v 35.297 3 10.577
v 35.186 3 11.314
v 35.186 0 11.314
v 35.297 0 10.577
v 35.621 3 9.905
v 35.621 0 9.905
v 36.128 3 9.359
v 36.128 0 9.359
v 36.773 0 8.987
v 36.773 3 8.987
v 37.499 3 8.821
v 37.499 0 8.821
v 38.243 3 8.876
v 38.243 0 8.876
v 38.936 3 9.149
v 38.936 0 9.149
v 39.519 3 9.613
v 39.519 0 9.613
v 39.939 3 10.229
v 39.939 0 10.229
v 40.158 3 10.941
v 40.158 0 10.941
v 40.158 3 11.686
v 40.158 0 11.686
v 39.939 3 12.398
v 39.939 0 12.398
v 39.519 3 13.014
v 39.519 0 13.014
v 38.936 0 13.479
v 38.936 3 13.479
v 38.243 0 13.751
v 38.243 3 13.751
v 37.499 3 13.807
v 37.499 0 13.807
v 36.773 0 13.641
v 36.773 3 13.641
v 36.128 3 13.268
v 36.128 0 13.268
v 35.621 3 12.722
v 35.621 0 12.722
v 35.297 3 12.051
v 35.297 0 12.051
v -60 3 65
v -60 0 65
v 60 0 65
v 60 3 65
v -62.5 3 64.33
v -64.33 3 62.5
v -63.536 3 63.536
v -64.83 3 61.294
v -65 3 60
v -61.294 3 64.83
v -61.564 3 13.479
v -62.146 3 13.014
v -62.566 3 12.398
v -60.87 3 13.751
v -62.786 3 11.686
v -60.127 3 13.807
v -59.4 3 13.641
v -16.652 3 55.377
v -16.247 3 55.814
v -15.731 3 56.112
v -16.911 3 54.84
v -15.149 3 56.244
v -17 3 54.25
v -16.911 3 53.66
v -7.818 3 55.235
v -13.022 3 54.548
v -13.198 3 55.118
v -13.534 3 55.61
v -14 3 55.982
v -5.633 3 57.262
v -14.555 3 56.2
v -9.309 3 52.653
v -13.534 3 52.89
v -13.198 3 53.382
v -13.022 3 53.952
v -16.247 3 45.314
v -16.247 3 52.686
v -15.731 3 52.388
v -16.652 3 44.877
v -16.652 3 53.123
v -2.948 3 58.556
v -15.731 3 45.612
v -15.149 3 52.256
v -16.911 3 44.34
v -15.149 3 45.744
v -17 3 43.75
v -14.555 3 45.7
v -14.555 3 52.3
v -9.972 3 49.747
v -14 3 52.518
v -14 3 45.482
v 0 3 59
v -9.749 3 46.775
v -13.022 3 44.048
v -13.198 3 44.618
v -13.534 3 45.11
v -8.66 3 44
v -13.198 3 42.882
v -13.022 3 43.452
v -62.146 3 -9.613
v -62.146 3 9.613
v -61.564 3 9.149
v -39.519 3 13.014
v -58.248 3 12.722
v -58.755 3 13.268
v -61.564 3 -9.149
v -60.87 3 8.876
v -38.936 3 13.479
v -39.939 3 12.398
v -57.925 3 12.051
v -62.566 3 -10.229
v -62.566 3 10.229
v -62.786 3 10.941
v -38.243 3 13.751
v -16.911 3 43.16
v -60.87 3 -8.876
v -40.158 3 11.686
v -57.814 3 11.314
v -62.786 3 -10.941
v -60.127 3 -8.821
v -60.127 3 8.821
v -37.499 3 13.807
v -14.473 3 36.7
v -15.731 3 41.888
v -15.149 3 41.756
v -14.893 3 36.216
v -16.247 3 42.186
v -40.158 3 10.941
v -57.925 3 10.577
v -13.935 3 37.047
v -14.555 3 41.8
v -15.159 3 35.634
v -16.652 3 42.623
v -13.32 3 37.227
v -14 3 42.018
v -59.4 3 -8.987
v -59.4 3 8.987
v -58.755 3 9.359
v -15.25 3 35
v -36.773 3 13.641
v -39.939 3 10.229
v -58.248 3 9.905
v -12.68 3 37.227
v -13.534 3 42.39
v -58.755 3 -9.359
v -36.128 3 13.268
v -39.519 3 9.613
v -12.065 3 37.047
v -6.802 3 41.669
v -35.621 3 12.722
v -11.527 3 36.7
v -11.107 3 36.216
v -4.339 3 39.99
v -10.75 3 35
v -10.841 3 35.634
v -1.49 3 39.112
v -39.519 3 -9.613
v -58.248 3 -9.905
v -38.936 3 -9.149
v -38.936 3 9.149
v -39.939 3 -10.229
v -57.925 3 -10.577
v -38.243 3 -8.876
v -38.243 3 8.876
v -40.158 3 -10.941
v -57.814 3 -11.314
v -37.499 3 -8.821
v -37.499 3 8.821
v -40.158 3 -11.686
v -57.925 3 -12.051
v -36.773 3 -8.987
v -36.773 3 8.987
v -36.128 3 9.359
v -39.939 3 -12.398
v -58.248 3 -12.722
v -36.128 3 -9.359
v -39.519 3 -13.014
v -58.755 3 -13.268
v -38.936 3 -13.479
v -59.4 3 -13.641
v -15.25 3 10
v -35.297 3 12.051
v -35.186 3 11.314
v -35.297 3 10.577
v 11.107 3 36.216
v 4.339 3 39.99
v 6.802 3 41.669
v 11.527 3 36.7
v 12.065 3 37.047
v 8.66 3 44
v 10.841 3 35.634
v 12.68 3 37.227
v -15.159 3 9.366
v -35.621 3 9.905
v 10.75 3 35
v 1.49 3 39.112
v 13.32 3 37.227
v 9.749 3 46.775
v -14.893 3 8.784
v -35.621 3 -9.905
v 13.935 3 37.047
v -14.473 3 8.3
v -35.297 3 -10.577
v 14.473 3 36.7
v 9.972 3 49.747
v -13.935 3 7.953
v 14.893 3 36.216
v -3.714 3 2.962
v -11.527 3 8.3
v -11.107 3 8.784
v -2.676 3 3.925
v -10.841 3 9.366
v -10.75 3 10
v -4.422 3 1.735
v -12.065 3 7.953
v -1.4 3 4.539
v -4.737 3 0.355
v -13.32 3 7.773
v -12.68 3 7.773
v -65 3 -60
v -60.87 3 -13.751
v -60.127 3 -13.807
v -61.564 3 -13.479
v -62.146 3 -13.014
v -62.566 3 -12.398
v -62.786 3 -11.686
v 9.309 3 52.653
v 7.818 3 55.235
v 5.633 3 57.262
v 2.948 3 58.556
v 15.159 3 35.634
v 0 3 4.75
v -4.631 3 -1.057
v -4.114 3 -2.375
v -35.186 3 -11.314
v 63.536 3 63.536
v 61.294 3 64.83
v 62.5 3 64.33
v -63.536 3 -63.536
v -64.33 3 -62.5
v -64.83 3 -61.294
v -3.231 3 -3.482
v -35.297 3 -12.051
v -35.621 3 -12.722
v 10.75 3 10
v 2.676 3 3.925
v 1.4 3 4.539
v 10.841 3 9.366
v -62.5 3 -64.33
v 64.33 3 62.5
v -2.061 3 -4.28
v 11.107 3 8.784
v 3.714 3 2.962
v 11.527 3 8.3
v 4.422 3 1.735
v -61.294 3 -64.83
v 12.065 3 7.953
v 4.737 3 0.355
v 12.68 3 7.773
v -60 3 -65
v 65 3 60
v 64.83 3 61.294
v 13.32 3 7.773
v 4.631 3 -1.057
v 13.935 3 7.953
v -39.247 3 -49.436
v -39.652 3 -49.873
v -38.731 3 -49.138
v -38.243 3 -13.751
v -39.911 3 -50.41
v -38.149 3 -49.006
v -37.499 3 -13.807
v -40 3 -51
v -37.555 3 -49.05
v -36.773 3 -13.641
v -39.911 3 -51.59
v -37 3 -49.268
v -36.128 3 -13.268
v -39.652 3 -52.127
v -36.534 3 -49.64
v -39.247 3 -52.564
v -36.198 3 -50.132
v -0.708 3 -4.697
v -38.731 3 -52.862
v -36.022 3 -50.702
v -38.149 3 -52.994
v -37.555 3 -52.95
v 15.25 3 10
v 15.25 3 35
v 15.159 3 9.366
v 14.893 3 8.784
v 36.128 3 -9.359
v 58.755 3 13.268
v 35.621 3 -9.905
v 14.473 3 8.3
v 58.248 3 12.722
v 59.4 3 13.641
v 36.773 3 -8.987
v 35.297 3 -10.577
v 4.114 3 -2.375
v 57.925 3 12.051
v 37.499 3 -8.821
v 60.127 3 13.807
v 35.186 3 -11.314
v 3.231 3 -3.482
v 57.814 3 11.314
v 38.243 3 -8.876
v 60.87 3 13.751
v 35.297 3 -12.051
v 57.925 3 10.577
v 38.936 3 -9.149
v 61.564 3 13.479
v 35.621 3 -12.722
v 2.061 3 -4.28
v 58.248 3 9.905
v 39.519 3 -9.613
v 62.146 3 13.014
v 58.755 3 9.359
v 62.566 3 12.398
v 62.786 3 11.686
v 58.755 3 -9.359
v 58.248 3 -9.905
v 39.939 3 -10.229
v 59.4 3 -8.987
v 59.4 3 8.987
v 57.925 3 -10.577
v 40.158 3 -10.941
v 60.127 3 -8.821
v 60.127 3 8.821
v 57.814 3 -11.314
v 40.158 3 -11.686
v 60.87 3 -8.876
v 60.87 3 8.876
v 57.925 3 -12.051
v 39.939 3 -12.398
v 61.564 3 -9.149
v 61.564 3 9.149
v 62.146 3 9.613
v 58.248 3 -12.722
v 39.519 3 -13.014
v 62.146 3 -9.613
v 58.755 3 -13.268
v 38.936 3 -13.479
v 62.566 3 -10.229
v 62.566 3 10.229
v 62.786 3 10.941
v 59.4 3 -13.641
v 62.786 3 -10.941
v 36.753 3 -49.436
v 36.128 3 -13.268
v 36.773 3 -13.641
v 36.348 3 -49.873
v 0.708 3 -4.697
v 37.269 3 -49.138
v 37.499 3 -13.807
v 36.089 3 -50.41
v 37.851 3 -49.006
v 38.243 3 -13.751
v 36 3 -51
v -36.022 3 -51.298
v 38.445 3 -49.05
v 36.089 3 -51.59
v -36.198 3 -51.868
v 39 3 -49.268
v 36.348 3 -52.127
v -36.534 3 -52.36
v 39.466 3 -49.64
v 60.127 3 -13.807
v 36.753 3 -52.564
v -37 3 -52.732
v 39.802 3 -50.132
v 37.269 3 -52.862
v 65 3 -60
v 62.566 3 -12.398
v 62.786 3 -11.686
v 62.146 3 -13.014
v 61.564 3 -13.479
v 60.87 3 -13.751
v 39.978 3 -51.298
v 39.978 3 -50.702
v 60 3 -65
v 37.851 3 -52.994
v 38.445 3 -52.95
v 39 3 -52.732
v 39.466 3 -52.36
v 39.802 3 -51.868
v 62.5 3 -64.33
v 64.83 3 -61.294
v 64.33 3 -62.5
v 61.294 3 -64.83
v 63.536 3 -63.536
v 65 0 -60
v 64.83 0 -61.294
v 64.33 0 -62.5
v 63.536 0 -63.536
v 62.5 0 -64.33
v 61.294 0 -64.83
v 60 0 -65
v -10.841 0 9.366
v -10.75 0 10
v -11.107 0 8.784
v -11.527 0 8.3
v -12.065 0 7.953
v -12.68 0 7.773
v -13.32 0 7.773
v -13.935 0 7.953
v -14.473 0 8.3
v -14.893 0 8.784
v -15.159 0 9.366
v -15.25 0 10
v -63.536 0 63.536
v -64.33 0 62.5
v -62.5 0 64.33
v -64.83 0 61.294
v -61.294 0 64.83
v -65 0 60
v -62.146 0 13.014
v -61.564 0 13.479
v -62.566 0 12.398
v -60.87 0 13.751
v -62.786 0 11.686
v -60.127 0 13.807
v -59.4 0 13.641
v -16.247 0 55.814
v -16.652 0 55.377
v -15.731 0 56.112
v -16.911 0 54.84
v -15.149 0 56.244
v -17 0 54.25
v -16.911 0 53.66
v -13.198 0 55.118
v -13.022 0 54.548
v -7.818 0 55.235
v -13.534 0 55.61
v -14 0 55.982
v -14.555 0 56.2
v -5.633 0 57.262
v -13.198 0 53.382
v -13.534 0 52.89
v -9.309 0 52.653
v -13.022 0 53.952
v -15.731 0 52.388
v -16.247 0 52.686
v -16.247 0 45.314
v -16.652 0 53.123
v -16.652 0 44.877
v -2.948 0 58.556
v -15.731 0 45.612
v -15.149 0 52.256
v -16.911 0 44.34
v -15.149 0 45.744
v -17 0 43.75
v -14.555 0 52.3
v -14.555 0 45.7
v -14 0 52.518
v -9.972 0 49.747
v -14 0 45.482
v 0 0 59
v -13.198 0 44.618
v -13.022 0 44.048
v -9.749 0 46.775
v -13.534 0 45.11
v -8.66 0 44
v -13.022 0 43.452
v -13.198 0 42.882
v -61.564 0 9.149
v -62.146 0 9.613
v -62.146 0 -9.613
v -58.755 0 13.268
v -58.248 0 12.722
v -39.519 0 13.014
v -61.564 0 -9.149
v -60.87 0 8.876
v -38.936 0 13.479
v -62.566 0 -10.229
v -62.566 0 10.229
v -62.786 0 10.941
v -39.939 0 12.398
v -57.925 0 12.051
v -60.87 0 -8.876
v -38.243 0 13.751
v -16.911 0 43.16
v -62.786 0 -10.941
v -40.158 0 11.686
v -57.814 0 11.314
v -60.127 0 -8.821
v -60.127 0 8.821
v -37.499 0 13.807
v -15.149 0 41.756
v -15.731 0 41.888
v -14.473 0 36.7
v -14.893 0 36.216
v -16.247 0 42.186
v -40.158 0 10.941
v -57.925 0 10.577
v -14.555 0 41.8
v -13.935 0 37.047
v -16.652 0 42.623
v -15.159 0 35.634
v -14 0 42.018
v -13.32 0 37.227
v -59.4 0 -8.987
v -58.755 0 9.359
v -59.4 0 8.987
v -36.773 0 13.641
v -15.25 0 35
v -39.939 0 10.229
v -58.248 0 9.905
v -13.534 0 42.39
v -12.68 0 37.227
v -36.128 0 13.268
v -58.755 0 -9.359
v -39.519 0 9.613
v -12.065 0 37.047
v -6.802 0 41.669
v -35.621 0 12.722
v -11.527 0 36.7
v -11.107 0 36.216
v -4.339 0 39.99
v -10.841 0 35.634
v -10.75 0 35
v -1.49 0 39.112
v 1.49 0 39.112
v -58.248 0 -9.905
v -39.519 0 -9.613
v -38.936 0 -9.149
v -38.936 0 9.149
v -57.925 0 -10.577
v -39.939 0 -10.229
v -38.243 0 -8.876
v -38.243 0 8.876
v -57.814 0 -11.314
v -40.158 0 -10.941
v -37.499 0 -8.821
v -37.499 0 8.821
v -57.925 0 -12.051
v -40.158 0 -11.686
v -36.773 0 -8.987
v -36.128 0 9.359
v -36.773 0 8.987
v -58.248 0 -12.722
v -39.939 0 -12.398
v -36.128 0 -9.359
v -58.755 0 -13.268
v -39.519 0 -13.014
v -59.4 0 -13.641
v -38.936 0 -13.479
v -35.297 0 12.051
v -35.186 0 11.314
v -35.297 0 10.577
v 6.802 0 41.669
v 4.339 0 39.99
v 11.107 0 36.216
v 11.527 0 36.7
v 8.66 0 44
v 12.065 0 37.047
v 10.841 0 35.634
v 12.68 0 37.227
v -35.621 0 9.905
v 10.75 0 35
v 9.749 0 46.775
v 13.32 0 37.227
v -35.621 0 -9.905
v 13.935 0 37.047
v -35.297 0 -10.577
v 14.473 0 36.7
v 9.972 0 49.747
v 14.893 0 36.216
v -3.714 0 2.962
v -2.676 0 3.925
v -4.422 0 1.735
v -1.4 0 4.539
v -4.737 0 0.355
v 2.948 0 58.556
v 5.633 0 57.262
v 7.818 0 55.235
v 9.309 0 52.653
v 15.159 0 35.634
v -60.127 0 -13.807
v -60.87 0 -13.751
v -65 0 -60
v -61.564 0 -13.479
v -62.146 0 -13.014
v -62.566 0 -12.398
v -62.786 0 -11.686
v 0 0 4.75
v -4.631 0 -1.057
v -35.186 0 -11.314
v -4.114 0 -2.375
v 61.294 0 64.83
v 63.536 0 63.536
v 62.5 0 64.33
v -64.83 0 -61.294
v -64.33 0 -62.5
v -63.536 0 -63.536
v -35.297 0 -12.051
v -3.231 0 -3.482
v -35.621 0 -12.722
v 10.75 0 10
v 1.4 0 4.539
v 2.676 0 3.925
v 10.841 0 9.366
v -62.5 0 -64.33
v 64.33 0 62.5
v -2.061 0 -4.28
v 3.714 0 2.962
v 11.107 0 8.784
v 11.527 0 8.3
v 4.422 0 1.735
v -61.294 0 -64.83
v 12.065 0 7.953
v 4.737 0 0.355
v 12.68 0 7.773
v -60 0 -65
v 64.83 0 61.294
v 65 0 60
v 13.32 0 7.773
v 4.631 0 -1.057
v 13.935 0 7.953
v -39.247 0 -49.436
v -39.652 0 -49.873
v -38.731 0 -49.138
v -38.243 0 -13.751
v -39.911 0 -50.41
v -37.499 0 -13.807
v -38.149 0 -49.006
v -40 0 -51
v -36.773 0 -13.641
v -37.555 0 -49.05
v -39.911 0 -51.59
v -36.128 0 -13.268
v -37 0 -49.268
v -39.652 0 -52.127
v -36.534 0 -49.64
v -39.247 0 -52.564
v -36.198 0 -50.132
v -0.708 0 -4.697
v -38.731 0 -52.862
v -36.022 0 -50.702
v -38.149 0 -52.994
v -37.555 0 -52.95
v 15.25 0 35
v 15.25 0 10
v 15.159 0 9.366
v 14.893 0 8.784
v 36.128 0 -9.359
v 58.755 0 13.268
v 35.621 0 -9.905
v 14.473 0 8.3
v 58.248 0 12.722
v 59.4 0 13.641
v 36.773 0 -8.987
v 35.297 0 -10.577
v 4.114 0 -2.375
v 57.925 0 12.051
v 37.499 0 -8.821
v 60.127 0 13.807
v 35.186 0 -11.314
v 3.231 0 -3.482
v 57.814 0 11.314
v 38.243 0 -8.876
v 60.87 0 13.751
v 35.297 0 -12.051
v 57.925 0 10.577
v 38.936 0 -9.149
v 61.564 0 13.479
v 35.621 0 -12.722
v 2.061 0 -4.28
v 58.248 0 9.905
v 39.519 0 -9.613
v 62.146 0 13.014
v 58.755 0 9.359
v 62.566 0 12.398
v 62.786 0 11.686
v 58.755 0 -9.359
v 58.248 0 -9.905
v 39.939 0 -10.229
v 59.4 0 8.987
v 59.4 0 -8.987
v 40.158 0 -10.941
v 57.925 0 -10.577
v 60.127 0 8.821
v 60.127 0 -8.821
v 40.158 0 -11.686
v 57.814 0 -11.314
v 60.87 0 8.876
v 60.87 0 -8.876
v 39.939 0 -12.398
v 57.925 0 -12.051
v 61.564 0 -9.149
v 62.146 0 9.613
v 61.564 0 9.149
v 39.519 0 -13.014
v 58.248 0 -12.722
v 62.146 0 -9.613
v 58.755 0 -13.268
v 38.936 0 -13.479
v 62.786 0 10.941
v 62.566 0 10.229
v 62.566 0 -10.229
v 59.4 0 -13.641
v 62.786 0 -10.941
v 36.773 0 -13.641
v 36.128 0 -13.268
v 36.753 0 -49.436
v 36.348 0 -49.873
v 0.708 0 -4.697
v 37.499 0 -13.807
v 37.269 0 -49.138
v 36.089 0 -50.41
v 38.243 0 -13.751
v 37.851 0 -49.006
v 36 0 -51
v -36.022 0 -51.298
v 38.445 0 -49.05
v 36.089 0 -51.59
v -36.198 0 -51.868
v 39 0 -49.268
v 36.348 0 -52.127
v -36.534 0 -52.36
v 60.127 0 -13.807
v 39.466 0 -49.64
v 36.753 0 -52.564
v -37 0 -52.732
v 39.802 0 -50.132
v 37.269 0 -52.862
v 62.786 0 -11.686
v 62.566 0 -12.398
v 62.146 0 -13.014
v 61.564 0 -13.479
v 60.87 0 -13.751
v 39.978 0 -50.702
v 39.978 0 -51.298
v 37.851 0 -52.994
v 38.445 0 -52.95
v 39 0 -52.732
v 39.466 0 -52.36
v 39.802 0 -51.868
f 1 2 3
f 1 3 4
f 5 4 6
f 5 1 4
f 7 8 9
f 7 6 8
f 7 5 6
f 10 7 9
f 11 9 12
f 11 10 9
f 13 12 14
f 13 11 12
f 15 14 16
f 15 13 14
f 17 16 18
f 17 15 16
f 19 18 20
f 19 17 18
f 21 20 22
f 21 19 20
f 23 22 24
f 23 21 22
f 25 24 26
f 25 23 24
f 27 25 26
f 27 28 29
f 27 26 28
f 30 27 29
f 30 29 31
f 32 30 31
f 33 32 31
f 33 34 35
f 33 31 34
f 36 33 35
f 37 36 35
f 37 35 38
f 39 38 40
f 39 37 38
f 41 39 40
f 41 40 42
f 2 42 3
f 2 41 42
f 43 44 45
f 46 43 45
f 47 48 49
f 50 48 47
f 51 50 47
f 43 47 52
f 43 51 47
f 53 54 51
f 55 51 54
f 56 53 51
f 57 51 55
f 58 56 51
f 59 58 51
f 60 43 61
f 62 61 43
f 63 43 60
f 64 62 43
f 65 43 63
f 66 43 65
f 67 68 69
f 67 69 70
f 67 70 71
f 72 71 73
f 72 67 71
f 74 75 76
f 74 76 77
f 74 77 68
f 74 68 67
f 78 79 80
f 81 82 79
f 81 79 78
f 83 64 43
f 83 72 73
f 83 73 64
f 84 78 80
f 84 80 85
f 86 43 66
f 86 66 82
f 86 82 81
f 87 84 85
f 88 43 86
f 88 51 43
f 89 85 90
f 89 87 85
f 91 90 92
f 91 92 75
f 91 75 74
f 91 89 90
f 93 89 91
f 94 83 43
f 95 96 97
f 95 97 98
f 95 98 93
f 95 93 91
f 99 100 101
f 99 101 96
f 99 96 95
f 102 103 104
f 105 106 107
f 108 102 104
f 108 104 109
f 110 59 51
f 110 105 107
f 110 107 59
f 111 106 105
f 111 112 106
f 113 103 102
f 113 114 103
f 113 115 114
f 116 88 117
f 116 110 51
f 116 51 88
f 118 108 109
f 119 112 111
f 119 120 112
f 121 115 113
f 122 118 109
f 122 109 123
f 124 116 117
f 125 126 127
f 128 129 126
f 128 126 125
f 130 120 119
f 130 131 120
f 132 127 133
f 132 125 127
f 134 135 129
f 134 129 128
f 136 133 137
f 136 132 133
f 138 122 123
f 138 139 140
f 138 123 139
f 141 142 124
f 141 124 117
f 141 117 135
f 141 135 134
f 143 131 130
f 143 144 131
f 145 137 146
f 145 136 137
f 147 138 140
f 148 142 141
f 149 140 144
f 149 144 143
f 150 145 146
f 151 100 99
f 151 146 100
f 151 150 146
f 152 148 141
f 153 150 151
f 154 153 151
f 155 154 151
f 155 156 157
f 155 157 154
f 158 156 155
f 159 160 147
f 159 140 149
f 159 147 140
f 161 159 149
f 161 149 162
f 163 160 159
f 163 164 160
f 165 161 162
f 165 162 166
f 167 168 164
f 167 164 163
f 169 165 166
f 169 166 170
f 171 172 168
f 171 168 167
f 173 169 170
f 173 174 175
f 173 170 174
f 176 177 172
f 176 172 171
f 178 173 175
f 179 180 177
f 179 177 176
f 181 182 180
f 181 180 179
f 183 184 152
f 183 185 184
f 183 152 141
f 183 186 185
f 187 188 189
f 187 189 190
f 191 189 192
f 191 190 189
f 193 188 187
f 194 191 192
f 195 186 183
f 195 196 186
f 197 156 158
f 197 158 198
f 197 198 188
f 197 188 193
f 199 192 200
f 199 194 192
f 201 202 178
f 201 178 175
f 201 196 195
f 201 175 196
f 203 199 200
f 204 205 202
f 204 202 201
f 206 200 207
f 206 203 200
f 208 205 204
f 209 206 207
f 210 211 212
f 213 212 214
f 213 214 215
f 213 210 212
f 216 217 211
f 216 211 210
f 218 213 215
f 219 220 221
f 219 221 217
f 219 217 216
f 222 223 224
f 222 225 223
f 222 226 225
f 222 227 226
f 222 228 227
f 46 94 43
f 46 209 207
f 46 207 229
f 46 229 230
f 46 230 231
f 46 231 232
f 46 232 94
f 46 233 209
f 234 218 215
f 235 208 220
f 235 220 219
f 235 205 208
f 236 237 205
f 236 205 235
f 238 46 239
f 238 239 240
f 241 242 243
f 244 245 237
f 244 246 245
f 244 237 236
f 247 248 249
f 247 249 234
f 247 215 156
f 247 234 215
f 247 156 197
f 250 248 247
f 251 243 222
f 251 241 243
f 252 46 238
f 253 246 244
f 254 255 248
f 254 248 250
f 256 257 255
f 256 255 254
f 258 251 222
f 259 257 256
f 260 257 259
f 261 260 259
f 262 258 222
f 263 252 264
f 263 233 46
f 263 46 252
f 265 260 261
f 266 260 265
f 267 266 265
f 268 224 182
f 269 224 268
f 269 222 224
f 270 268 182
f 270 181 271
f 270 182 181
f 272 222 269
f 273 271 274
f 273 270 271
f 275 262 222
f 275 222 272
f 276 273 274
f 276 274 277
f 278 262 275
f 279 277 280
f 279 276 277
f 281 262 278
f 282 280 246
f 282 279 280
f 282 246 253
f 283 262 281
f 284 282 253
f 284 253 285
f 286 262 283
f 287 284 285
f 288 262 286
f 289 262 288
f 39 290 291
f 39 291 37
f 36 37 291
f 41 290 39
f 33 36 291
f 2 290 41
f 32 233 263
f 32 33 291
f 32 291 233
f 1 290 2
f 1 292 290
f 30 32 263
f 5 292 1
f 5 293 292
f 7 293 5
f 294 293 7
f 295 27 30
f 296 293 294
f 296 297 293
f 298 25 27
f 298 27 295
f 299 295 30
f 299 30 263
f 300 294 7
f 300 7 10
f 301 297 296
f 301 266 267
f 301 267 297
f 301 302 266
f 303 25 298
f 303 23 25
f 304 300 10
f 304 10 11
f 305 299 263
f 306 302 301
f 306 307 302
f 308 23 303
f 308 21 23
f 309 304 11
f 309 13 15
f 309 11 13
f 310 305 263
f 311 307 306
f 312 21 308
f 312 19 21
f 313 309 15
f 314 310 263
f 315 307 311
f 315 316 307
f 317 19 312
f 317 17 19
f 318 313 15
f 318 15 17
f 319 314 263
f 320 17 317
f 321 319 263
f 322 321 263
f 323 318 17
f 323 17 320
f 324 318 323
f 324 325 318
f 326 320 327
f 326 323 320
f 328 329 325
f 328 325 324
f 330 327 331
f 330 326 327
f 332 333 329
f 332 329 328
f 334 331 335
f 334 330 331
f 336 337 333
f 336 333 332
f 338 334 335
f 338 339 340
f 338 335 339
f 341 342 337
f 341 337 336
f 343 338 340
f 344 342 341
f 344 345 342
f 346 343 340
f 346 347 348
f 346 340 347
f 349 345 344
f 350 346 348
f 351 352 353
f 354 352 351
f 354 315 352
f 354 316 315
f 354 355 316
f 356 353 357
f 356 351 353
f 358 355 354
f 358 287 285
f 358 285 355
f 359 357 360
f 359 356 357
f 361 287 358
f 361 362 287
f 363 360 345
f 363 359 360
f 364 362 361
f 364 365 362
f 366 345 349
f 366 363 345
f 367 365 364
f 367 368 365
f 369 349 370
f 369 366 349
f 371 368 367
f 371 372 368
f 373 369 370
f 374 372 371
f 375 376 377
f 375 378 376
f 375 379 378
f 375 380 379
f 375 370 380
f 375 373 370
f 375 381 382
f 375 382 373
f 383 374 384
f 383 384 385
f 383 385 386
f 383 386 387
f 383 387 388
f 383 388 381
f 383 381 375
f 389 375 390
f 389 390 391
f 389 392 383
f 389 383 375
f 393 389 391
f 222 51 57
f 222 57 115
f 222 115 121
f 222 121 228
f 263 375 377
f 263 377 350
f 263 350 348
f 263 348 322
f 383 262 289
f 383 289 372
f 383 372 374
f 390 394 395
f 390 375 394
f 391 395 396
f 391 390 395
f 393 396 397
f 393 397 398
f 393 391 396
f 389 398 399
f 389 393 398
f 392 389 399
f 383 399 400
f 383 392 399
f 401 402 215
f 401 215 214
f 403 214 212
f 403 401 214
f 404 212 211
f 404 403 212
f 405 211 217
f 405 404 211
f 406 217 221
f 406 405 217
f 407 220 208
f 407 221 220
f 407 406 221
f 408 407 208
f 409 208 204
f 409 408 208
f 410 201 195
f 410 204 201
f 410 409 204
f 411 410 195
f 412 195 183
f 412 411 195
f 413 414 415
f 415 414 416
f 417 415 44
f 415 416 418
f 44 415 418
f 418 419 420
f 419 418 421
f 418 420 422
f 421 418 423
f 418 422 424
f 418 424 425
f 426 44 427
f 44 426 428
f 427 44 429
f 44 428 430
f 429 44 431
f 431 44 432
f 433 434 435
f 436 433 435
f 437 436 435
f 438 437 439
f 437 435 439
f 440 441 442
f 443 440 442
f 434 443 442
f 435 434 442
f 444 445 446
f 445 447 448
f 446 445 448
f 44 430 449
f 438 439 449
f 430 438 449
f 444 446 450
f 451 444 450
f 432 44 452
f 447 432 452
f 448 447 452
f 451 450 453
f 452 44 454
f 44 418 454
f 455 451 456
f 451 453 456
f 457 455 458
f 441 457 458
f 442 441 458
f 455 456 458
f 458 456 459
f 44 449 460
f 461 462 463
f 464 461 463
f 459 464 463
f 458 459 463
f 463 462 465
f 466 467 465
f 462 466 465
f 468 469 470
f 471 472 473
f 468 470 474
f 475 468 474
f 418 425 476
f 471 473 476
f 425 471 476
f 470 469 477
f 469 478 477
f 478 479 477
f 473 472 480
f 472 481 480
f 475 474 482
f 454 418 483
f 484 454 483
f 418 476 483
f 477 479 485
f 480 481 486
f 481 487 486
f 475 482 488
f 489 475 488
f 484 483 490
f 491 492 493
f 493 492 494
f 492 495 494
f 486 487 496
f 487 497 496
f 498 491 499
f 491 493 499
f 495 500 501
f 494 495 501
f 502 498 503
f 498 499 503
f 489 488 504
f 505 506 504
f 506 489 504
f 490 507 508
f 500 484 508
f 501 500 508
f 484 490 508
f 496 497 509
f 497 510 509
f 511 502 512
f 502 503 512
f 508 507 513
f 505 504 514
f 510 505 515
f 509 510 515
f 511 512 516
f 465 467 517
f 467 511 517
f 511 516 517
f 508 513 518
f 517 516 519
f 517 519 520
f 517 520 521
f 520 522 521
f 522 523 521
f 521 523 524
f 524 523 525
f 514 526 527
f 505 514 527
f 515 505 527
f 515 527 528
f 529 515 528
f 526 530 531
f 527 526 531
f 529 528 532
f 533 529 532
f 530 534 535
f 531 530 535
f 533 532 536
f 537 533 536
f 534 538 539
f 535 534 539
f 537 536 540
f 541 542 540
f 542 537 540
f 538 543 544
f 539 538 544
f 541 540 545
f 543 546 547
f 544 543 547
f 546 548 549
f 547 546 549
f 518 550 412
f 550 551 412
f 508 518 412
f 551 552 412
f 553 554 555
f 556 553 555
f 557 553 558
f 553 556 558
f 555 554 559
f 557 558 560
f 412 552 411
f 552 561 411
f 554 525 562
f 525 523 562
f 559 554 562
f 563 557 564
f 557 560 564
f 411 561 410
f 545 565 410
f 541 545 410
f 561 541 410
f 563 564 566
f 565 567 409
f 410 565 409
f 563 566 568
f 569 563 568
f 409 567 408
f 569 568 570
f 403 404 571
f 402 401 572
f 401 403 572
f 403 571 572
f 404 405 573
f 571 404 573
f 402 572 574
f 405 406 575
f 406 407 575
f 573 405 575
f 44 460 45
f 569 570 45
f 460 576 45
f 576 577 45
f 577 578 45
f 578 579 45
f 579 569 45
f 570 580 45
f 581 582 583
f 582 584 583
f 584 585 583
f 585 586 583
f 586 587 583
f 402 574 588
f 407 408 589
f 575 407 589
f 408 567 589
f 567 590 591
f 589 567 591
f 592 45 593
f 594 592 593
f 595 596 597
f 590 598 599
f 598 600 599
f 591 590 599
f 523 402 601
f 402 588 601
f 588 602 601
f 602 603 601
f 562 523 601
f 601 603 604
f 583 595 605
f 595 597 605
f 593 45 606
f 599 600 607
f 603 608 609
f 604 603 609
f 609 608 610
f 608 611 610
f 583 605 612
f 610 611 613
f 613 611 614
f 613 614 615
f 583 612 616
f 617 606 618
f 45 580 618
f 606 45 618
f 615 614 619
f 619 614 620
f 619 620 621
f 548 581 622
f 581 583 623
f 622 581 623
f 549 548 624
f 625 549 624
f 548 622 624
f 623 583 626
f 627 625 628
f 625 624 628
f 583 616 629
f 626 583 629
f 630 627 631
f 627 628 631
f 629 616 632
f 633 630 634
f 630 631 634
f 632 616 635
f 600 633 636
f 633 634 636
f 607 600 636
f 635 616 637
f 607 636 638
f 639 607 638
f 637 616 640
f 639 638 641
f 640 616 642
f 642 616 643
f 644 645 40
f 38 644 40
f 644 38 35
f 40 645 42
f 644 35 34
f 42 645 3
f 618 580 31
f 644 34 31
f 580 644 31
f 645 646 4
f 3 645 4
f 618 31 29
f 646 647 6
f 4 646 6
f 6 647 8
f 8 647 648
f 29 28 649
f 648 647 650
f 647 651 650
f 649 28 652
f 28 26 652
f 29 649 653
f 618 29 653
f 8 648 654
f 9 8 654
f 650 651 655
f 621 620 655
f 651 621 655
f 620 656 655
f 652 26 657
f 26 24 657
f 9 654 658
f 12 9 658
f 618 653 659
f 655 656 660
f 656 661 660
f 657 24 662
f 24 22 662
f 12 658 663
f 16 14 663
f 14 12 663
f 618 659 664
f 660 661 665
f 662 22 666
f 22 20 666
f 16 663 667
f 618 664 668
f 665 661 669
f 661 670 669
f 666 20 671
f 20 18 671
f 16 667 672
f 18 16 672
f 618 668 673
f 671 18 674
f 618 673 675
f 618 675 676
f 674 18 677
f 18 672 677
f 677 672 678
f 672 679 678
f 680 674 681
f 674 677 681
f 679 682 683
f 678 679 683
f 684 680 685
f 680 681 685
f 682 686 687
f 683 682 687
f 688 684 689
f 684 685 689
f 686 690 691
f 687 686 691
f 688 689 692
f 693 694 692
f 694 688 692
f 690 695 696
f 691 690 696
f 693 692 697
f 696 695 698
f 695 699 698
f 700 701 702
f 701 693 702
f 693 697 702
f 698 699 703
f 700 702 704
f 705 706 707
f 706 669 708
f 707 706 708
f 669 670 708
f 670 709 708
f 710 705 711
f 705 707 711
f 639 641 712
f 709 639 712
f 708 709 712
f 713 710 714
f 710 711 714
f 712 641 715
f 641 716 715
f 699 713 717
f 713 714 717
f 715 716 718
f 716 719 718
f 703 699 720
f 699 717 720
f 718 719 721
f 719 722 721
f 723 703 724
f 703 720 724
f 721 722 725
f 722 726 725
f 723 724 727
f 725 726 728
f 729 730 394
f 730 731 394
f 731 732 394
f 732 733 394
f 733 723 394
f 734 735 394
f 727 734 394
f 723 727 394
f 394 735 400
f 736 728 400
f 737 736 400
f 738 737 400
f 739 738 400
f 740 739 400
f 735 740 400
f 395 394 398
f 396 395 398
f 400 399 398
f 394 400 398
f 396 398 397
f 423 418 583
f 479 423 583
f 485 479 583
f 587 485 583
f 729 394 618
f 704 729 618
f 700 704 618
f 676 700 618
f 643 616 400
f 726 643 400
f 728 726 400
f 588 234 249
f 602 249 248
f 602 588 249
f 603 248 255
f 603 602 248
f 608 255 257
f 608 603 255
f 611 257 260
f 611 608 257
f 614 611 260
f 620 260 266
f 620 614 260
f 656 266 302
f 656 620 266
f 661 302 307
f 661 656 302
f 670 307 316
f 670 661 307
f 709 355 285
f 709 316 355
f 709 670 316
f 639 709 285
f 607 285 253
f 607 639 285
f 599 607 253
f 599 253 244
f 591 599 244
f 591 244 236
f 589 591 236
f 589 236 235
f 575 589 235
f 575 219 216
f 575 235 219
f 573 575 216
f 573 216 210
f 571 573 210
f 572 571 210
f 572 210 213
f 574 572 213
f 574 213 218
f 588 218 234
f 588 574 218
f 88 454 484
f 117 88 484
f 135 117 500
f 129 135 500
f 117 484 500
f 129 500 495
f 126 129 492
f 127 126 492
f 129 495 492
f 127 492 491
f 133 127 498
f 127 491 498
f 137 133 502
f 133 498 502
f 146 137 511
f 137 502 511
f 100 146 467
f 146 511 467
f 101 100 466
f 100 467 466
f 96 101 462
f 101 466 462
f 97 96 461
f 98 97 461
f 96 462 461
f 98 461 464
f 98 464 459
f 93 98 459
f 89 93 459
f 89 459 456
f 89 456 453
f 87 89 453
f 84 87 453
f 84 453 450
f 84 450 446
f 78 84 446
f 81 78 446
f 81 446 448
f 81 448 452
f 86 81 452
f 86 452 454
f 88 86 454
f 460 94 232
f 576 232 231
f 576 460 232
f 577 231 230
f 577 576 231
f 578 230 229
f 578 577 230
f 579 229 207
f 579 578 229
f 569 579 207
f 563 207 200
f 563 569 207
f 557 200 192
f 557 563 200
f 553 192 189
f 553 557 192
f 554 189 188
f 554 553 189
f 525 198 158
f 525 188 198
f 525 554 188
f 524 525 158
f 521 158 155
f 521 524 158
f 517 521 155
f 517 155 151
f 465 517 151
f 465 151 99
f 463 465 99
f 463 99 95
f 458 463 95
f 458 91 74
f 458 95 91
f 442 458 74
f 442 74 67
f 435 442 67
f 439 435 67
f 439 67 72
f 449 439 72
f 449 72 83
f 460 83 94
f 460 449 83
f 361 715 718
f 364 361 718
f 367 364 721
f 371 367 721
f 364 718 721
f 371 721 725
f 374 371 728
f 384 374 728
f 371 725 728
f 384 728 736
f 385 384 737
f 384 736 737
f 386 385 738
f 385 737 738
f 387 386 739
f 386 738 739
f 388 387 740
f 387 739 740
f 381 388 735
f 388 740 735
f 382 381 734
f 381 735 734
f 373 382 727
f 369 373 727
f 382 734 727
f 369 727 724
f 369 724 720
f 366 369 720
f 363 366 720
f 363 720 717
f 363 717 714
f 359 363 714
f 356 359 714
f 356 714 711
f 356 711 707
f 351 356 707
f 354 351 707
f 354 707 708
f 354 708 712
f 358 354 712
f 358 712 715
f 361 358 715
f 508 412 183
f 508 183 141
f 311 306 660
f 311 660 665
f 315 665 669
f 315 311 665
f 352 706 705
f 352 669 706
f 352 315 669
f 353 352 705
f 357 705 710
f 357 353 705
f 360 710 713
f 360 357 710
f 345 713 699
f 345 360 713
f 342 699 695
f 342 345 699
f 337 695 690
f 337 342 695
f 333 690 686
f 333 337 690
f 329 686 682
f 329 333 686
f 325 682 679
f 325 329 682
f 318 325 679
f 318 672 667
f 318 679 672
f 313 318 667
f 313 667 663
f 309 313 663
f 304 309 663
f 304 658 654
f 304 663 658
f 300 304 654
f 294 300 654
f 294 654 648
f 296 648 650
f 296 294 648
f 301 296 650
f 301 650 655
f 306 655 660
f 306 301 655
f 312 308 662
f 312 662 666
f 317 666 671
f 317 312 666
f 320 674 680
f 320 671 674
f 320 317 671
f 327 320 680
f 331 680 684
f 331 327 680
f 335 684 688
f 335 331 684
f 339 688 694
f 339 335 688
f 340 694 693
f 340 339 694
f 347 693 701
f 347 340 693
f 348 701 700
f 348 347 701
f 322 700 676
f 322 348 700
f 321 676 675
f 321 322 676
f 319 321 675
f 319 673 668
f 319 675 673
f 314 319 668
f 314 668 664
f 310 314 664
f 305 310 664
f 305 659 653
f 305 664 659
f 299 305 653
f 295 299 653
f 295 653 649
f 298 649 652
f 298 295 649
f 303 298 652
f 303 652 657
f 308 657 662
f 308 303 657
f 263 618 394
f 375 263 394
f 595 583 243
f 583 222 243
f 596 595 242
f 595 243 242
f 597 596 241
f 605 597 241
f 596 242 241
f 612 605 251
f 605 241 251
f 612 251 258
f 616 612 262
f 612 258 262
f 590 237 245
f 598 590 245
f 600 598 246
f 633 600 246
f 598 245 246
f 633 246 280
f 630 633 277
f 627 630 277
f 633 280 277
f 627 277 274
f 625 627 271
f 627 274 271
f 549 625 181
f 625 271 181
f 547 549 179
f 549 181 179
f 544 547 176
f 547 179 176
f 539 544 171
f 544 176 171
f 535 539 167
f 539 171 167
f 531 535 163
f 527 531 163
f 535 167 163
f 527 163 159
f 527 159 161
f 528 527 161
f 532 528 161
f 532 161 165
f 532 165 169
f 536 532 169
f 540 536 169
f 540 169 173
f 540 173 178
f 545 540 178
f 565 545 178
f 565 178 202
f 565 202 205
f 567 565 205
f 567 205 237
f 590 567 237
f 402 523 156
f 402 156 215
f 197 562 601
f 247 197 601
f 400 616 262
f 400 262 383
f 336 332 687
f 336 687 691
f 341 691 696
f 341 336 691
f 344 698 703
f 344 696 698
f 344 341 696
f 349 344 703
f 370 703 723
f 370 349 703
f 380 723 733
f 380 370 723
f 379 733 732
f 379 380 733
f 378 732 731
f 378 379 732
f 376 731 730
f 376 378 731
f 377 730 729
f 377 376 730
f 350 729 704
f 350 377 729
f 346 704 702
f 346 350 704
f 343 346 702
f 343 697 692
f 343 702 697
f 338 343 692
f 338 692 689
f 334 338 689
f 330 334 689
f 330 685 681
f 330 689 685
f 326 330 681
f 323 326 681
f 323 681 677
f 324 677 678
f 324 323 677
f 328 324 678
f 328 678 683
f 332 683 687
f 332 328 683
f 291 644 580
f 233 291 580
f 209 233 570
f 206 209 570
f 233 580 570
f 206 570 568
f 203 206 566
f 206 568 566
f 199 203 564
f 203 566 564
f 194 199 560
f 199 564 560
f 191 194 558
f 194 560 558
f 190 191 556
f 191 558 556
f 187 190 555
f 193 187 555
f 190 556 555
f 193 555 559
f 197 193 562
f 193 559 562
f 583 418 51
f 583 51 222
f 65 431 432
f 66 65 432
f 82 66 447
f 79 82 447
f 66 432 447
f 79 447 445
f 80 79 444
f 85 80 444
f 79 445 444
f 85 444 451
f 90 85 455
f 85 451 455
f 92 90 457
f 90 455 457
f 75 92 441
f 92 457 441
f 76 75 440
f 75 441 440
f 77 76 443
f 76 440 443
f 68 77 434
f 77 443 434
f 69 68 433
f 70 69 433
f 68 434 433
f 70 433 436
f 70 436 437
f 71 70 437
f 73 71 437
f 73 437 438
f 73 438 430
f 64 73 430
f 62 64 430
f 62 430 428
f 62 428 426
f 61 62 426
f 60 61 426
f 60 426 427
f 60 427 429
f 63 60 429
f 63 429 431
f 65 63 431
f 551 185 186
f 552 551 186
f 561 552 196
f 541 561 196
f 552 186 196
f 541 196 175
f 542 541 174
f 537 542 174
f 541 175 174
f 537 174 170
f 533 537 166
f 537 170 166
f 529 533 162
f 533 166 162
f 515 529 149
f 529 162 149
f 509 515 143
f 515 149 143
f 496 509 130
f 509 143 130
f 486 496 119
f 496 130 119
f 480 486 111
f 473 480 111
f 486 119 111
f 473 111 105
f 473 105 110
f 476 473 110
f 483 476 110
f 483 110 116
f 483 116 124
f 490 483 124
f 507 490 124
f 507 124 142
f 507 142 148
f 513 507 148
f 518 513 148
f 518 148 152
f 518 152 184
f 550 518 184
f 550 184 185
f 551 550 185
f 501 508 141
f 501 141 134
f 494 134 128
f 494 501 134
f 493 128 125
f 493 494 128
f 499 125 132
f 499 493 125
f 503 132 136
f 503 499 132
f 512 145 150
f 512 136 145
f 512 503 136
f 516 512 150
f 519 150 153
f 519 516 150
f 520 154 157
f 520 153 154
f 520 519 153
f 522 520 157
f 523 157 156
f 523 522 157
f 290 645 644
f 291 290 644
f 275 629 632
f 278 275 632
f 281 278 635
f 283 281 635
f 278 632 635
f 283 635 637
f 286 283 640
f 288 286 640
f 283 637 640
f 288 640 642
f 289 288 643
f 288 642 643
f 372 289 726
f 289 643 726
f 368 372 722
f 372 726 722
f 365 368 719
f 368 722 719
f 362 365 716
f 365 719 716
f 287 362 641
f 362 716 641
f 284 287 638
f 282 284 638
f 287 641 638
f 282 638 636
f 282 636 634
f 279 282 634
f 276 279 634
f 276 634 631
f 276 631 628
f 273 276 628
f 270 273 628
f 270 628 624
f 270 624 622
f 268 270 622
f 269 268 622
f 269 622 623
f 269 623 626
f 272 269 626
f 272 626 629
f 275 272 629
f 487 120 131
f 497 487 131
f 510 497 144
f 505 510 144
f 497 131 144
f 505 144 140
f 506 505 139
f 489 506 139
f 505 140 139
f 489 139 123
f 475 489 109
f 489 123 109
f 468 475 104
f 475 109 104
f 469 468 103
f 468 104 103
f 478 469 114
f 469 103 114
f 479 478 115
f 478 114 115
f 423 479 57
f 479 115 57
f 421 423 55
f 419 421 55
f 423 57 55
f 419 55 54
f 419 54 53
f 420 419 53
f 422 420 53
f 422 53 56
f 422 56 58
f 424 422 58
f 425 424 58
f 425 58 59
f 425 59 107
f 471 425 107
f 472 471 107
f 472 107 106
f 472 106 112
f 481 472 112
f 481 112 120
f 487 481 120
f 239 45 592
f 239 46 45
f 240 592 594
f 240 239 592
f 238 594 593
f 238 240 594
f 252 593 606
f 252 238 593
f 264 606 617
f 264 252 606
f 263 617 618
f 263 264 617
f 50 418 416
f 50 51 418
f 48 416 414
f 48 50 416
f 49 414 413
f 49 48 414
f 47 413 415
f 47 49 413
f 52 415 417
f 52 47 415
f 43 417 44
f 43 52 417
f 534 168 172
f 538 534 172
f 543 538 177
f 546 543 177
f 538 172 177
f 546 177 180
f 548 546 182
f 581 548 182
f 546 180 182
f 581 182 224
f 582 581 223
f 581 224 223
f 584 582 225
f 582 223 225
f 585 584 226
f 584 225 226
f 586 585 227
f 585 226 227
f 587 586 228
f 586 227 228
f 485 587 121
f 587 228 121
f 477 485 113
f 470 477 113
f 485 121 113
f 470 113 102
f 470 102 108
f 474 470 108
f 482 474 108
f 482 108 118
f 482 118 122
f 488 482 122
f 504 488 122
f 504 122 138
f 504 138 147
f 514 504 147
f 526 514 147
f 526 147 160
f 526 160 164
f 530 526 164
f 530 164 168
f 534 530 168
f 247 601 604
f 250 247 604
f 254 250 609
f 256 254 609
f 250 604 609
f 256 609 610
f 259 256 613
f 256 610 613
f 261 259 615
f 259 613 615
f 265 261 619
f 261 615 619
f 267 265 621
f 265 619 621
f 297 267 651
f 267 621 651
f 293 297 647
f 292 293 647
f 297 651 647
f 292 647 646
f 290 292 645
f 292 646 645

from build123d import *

# Parameters (mm, degrees)
SKETCH1_W                = 130
SKETCH1_H                = 130
BOSS_EXTRUDE1_DEPTH      = 3
FILLET1_R                = 5
SKETCH2_R                = 4.75
CUT_EXTRUDE1_DEPTH       = 92.972822073
F_5_0_5_DIAMETER_HOLE1_D = 5
F_4_0_4_DIAMETER_HOLE1_D = 4
SKETCH8_R                = 10
CUT_EXTRUDE2_DEPTH       = 92.972822073
F_4_0_4_DIAMETER_HOLE2_D = 4


with BuildPart() as part:
    # Sketch1 → Boss-Extrude1 (new body)
    with BuildSketch(Plane(origin=(0, 0, 0), x_dir=(1, 0, 0), z_dir=(0, 1, 0))):
        Rectangle(SKETCH1_W, SKETCH1_H)
    extrude(amount=BOSS_EXTRUDE1_DEPTH)

    # Fillet1
    fillet1_edges = [part.edges().sort_by_distance(p)[0] for p in [
        (65, 1.5, 65),
        (-65, 1.5, 65),
        (-65, 1.5, -65),
        (65, 1.5, -65),
    ]]
    fillet(fillet1_edges, radius=FILLET1_R)

    # Sketch2 → Cut-Extrude1 (cut, through all)
    with BuildSketch(Plane(origin=(0, 0, 0), x_dir=(1, 0, 0), z_dir=(0, 1, 0))):
        with Locations(Location((0, 0, 0), (0, 0, 270))):
            Circle(SKETCH2_R)
    extrude(amount=CUT_EXTRUDE1_DEPTH, mode=Mode.SUBTRACT)

    # Ø5.0 (5) Diameter Hole1 (through all)
    with Locations(Plane(origin=(0, 0, 0), x_dir=(-1, 0, 0), z_dir=(0, -1, 0))):
        with Locations((60.313708499, 11.313708499), (60.313708499, -11.313708499), (37.686291501, -11.313708499), (37.686291501, 11.313708499)):
            f_5_0_5_diameter_hole1 = Hole(F_5_0_5_DIAMETER_HOLE1_D / 2)

    # Mirror1: Ø5.0 (5) Diameter Hole1 across plane
    add(f_5_0_5_diameter_hole1.mirror(Plane(origin=(0, 0, 0), x_dir=(0, 0, 1), z_dir=(1, 0, 0))), mode=Mode.SUBTRACT)

    # Ø4.0 (4) Diameter Hole1 (through all)
    with Locations(Plane(origin=(0, 3, 0), x_dir=(1, 0, 0), z_dir=(0, 1, 0))):
        with Locations((38, 51), (-38, 51)):
            Hole(F_4_0_4_DIAMETER_HOLE1_D / 2)

    # Sketch8 → Cut-Extrude2 (cut, through all)
    with BuildSketch(Plane(origin=(0, 0, 0), x_dir=(1, 0, 0), z_dir=(0, 1, 0))):
        with Locations(Location((0, -49, 0), (0, 0, 270))):
            Circle(SKETCH8_R)
        with BuildLine():
            Line((10.75, -35), (10.75, -10))
            ThreePointArc((10.75, -10), (13, -7.75), (15.25, -10))
            Line((15.25, -10), (15.25, -35))
            ThreePointArc((15.25, -35), (13, -37.25), (10.75, -35))
        make_face()
        with BuildLine():
            Line((-10.75, -35), (-10.75, -10))
            ThreePointArc((-10.75, -10), (-13, -7.75), (-15.25, -10))
            Line((-15.25, -10), (-15.25, -35))
            ThreePointArc((-15.25, -35), (-13, -37.25), (-10.75, -35))
        make_face()
    extrude(amount=CUT_EXTRUDE2_DEPTH, mode=Mode.SUBTRACT)

    # Ø4.0 (4) Diameter Hole2 (through all)
    with Locations(Plane(origin=(0, 3, 0), x_dir=(1, 0, 0), z_dir=(0, 1, 0))):
        with Locations((-15, -54.25), (-15, -43.75)):
            Hole(F_4_0_4_DIAMETER_HOLE2_D / 2)


solid = part.part
